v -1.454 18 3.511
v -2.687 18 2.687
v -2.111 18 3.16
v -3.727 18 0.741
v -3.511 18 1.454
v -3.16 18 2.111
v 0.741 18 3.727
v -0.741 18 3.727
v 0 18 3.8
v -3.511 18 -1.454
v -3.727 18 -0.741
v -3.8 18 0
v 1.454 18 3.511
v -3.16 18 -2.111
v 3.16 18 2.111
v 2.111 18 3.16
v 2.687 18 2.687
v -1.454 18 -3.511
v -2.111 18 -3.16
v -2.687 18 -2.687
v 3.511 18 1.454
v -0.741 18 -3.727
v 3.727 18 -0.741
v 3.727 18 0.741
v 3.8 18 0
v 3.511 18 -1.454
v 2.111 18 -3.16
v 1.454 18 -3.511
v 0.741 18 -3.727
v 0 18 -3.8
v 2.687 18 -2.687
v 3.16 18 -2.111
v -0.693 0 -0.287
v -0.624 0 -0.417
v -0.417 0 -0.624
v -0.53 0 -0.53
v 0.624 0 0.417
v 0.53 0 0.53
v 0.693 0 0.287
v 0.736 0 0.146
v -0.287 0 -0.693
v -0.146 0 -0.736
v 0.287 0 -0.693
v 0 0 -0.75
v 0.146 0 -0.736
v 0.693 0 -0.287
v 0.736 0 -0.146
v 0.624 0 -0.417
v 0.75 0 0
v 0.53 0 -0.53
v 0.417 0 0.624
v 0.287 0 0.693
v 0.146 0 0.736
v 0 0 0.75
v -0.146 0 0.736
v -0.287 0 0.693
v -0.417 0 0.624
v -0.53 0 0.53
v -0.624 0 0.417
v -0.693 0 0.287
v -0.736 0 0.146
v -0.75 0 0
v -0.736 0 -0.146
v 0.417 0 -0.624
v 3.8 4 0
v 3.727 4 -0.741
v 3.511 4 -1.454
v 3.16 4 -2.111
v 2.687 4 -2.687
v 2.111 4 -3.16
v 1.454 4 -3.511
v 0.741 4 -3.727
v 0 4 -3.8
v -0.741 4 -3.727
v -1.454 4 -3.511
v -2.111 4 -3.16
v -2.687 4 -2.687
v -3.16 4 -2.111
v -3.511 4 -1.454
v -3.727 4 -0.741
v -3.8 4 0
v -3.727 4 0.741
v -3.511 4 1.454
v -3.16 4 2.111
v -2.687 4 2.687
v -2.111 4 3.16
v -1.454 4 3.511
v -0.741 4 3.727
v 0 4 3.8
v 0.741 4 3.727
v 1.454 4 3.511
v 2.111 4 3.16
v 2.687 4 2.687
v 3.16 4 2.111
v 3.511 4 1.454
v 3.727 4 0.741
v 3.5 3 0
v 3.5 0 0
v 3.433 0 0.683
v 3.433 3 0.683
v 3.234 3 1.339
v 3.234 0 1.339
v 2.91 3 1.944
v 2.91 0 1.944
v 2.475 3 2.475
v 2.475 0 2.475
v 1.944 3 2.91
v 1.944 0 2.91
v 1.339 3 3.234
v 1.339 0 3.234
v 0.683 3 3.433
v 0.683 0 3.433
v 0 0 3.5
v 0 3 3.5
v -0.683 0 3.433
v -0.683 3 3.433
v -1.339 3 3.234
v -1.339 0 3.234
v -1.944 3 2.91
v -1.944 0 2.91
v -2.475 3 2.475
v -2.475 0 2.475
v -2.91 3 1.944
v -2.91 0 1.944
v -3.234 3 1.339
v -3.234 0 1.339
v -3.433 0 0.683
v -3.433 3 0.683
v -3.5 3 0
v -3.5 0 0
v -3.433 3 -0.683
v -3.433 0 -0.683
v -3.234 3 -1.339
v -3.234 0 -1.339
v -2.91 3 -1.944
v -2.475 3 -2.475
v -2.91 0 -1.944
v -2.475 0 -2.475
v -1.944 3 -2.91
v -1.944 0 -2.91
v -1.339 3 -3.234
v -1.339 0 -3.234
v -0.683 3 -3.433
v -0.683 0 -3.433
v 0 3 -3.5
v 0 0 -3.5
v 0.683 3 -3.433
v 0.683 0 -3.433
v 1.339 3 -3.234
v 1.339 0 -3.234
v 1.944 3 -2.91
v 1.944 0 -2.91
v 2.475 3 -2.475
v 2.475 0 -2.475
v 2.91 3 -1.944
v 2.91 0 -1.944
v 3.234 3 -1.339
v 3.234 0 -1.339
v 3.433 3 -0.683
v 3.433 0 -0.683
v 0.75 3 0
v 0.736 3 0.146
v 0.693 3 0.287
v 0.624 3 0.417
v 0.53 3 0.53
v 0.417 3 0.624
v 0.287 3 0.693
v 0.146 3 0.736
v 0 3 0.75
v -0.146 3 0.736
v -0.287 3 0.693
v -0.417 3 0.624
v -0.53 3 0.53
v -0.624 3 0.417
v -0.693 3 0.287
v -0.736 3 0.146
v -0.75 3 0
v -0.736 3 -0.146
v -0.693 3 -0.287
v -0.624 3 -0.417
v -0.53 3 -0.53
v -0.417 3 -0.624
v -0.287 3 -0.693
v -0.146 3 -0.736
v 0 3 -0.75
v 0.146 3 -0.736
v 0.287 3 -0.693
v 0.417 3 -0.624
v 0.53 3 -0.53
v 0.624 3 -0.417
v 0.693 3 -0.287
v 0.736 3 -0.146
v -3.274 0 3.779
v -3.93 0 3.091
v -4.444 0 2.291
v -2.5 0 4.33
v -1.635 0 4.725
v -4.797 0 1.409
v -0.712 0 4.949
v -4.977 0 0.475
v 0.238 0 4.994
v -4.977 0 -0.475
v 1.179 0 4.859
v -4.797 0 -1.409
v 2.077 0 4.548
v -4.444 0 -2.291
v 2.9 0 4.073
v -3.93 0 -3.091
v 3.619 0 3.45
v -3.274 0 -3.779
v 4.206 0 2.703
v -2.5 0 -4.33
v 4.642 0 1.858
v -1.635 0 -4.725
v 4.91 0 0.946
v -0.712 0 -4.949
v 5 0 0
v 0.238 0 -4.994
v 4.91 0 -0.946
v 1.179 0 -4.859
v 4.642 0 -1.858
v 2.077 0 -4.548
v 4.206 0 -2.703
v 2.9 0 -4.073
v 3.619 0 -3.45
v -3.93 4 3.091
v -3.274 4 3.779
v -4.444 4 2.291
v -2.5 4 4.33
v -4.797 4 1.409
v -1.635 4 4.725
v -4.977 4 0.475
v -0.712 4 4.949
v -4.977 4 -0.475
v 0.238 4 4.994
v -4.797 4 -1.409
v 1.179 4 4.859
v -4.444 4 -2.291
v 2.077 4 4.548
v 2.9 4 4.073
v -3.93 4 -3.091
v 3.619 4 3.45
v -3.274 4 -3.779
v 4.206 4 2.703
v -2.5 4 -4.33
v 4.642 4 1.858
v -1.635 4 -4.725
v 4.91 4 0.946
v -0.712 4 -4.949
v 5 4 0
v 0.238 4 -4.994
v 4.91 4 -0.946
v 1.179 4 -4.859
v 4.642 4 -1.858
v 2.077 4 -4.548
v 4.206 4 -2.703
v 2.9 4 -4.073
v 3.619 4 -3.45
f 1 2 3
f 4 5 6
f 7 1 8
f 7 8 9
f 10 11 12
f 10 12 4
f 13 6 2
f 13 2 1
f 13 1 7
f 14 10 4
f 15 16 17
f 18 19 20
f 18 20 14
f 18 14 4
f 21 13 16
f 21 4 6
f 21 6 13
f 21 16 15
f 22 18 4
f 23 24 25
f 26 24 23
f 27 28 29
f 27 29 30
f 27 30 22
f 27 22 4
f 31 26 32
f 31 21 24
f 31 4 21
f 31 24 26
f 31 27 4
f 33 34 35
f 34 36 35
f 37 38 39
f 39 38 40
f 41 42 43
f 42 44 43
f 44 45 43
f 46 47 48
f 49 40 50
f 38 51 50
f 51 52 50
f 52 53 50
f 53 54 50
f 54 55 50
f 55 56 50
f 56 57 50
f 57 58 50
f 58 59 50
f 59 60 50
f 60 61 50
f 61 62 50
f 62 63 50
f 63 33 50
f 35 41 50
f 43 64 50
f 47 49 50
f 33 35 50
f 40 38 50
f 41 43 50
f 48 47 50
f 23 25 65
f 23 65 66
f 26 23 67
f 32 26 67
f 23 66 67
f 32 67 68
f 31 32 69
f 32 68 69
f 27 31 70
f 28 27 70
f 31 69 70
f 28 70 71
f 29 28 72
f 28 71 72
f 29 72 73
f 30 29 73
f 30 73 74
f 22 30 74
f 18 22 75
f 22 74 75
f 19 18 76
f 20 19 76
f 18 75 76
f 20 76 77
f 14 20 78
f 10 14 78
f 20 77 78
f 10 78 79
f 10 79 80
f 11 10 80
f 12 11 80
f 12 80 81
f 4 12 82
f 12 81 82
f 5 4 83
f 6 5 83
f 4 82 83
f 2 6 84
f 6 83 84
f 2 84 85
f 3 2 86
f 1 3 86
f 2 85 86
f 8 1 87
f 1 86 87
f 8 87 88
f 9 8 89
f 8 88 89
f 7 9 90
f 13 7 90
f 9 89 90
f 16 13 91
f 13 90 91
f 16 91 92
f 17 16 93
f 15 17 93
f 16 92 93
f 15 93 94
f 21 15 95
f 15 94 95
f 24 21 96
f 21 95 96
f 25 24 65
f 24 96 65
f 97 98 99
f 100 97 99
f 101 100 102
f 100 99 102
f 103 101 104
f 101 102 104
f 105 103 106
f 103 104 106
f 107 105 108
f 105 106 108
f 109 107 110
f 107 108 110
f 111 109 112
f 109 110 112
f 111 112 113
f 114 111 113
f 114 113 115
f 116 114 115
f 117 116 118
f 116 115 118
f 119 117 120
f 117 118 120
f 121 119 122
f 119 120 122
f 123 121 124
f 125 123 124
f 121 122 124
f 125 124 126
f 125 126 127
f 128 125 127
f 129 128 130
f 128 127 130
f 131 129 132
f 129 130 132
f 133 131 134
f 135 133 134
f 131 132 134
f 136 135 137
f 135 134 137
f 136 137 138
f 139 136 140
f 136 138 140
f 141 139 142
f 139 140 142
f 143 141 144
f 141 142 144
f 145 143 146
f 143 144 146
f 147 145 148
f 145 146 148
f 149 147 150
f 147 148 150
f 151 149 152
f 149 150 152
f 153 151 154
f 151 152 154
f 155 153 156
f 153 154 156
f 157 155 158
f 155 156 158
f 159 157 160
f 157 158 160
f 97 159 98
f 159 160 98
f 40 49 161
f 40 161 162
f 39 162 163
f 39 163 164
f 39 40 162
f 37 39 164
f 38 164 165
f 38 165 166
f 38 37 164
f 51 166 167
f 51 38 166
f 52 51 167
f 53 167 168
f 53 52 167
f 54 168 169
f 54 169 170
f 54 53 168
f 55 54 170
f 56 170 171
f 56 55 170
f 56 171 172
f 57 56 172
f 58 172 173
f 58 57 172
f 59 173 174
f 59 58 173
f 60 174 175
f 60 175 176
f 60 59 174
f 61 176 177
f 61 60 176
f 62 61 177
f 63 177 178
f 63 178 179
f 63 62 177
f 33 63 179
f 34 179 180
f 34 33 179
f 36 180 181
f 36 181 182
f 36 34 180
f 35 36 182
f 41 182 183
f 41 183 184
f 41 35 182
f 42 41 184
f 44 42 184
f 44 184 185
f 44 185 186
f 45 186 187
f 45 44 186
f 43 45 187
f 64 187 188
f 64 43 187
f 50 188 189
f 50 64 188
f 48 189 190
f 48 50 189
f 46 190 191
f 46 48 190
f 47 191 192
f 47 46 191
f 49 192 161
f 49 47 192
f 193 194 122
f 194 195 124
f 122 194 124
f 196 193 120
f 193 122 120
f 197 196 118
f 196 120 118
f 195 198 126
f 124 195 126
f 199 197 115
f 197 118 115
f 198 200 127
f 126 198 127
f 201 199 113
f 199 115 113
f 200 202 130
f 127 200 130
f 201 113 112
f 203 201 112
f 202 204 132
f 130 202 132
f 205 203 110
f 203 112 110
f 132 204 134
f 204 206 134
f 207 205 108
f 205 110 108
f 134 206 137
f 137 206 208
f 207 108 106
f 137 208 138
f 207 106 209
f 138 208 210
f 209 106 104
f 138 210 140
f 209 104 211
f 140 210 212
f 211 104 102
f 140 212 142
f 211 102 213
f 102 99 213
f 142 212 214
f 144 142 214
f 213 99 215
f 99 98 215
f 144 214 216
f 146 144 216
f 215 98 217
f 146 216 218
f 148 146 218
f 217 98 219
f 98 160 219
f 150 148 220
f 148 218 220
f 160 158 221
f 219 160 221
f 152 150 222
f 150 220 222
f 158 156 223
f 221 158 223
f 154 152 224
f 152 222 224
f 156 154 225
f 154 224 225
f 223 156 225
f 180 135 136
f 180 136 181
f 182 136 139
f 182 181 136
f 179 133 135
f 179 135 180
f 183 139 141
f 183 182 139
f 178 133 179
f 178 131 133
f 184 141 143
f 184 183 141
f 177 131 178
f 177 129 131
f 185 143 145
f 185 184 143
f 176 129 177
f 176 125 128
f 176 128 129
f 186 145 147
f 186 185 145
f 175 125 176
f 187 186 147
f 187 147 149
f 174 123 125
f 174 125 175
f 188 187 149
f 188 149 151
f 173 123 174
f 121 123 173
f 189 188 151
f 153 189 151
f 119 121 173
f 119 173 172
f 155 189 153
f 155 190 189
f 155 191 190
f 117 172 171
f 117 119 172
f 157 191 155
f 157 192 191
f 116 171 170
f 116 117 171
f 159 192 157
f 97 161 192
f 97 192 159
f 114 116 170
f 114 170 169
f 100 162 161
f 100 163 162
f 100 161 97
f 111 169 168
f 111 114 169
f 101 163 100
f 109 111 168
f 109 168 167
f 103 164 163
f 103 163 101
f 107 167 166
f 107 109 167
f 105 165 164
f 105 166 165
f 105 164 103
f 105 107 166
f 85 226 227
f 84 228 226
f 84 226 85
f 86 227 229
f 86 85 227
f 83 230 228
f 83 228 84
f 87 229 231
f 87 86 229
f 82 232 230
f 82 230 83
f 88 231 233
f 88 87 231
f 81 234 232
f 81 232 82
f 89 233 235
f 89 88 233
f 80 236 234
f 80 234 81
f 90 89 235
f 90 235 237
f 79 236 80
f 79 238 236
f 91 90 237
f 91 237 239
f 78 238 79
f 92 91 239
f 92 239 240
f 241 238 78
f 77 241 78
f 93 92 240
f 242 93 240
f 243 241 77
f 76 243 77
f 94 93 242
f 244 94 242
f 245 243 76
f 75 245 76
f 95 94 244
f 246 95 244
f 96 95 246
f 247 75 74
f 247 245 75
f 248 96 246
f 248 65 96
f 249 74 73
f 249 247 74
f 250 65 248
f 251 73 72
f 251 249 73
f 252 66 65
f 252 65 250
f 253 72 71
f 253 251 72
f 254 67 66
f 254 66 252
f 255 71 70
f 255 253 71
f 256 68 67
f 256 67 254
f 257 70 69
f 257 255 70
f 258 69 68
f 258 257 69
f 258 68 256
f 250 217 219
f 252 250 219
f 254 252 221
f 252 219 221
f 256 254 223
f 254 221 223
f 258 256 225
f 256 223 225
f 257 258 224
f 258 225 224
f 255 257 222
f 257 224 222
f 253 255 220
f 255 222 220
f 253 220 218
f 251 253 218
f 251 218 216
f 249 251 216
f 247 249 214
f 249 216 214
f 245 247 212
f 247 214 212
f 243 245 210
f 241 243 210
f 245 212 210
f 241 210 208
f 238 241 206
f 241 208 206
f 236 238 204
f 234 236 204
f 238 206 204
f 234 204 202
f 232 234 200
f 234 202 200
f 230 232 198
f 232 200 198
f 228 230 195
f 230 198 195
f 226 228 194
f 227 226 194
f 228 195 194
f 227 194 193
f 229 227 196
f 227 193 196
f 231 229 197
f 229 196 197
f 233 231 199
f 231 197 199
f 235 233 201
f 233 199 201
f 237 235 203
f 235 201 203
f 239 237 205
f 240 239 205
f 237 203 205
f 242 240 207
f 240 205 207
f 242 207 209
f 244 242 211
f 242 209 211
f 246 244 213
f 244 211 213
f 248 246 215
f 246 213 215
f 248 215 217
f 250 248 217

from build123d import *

# Parameters (mm, degrees)
SKETCH_1_R          = 5
EXTRUDE_1_DEPTH     = 4
SKETCH_2_R          = 3.8
EXTRUDE_2_DEPTH     = 14
SKETCH_3_R          = 3.5
SKETCH_3_R_2        = 0.75
CUT_EXTRUDE_1_DEPTH = 3


with BuildPart() as part:
    # 草图1 → 凸台-拉伸1 (new body)
    with BuildSketch(Plane(origin=(0, 0, 0), x_dir=(1, 0, 0), z_dir=(0, 1, 0))):
        Circle(SKETCH_1_R)
    extrude(amount=EXTRUDE_1_DEPTH)

    # 草图2 → 凸台-拉伸2 (add)
    with BuildSketch(Plane(origin=(0, 4, 0), x_dir=(1, 0, 0), z_dir=(0, 1, 0))):
        Circle(SKETCH_2_R)
    extrude(amount=EXTRUDE_2_DEPTH)

    # 草图3 → 切除-拉伸1 (cut)
    with BuildSketch(Plane.XZ):
        Circle(SKETCH_3_R)
        Circle(SKETCH_3_R_2, mode=Mode.SUBTRACT)
    extrude(amount=-CUT_EXTRUDE_1_DEPTH, mode=Mode.SUBTRACT)


solid = part.part
